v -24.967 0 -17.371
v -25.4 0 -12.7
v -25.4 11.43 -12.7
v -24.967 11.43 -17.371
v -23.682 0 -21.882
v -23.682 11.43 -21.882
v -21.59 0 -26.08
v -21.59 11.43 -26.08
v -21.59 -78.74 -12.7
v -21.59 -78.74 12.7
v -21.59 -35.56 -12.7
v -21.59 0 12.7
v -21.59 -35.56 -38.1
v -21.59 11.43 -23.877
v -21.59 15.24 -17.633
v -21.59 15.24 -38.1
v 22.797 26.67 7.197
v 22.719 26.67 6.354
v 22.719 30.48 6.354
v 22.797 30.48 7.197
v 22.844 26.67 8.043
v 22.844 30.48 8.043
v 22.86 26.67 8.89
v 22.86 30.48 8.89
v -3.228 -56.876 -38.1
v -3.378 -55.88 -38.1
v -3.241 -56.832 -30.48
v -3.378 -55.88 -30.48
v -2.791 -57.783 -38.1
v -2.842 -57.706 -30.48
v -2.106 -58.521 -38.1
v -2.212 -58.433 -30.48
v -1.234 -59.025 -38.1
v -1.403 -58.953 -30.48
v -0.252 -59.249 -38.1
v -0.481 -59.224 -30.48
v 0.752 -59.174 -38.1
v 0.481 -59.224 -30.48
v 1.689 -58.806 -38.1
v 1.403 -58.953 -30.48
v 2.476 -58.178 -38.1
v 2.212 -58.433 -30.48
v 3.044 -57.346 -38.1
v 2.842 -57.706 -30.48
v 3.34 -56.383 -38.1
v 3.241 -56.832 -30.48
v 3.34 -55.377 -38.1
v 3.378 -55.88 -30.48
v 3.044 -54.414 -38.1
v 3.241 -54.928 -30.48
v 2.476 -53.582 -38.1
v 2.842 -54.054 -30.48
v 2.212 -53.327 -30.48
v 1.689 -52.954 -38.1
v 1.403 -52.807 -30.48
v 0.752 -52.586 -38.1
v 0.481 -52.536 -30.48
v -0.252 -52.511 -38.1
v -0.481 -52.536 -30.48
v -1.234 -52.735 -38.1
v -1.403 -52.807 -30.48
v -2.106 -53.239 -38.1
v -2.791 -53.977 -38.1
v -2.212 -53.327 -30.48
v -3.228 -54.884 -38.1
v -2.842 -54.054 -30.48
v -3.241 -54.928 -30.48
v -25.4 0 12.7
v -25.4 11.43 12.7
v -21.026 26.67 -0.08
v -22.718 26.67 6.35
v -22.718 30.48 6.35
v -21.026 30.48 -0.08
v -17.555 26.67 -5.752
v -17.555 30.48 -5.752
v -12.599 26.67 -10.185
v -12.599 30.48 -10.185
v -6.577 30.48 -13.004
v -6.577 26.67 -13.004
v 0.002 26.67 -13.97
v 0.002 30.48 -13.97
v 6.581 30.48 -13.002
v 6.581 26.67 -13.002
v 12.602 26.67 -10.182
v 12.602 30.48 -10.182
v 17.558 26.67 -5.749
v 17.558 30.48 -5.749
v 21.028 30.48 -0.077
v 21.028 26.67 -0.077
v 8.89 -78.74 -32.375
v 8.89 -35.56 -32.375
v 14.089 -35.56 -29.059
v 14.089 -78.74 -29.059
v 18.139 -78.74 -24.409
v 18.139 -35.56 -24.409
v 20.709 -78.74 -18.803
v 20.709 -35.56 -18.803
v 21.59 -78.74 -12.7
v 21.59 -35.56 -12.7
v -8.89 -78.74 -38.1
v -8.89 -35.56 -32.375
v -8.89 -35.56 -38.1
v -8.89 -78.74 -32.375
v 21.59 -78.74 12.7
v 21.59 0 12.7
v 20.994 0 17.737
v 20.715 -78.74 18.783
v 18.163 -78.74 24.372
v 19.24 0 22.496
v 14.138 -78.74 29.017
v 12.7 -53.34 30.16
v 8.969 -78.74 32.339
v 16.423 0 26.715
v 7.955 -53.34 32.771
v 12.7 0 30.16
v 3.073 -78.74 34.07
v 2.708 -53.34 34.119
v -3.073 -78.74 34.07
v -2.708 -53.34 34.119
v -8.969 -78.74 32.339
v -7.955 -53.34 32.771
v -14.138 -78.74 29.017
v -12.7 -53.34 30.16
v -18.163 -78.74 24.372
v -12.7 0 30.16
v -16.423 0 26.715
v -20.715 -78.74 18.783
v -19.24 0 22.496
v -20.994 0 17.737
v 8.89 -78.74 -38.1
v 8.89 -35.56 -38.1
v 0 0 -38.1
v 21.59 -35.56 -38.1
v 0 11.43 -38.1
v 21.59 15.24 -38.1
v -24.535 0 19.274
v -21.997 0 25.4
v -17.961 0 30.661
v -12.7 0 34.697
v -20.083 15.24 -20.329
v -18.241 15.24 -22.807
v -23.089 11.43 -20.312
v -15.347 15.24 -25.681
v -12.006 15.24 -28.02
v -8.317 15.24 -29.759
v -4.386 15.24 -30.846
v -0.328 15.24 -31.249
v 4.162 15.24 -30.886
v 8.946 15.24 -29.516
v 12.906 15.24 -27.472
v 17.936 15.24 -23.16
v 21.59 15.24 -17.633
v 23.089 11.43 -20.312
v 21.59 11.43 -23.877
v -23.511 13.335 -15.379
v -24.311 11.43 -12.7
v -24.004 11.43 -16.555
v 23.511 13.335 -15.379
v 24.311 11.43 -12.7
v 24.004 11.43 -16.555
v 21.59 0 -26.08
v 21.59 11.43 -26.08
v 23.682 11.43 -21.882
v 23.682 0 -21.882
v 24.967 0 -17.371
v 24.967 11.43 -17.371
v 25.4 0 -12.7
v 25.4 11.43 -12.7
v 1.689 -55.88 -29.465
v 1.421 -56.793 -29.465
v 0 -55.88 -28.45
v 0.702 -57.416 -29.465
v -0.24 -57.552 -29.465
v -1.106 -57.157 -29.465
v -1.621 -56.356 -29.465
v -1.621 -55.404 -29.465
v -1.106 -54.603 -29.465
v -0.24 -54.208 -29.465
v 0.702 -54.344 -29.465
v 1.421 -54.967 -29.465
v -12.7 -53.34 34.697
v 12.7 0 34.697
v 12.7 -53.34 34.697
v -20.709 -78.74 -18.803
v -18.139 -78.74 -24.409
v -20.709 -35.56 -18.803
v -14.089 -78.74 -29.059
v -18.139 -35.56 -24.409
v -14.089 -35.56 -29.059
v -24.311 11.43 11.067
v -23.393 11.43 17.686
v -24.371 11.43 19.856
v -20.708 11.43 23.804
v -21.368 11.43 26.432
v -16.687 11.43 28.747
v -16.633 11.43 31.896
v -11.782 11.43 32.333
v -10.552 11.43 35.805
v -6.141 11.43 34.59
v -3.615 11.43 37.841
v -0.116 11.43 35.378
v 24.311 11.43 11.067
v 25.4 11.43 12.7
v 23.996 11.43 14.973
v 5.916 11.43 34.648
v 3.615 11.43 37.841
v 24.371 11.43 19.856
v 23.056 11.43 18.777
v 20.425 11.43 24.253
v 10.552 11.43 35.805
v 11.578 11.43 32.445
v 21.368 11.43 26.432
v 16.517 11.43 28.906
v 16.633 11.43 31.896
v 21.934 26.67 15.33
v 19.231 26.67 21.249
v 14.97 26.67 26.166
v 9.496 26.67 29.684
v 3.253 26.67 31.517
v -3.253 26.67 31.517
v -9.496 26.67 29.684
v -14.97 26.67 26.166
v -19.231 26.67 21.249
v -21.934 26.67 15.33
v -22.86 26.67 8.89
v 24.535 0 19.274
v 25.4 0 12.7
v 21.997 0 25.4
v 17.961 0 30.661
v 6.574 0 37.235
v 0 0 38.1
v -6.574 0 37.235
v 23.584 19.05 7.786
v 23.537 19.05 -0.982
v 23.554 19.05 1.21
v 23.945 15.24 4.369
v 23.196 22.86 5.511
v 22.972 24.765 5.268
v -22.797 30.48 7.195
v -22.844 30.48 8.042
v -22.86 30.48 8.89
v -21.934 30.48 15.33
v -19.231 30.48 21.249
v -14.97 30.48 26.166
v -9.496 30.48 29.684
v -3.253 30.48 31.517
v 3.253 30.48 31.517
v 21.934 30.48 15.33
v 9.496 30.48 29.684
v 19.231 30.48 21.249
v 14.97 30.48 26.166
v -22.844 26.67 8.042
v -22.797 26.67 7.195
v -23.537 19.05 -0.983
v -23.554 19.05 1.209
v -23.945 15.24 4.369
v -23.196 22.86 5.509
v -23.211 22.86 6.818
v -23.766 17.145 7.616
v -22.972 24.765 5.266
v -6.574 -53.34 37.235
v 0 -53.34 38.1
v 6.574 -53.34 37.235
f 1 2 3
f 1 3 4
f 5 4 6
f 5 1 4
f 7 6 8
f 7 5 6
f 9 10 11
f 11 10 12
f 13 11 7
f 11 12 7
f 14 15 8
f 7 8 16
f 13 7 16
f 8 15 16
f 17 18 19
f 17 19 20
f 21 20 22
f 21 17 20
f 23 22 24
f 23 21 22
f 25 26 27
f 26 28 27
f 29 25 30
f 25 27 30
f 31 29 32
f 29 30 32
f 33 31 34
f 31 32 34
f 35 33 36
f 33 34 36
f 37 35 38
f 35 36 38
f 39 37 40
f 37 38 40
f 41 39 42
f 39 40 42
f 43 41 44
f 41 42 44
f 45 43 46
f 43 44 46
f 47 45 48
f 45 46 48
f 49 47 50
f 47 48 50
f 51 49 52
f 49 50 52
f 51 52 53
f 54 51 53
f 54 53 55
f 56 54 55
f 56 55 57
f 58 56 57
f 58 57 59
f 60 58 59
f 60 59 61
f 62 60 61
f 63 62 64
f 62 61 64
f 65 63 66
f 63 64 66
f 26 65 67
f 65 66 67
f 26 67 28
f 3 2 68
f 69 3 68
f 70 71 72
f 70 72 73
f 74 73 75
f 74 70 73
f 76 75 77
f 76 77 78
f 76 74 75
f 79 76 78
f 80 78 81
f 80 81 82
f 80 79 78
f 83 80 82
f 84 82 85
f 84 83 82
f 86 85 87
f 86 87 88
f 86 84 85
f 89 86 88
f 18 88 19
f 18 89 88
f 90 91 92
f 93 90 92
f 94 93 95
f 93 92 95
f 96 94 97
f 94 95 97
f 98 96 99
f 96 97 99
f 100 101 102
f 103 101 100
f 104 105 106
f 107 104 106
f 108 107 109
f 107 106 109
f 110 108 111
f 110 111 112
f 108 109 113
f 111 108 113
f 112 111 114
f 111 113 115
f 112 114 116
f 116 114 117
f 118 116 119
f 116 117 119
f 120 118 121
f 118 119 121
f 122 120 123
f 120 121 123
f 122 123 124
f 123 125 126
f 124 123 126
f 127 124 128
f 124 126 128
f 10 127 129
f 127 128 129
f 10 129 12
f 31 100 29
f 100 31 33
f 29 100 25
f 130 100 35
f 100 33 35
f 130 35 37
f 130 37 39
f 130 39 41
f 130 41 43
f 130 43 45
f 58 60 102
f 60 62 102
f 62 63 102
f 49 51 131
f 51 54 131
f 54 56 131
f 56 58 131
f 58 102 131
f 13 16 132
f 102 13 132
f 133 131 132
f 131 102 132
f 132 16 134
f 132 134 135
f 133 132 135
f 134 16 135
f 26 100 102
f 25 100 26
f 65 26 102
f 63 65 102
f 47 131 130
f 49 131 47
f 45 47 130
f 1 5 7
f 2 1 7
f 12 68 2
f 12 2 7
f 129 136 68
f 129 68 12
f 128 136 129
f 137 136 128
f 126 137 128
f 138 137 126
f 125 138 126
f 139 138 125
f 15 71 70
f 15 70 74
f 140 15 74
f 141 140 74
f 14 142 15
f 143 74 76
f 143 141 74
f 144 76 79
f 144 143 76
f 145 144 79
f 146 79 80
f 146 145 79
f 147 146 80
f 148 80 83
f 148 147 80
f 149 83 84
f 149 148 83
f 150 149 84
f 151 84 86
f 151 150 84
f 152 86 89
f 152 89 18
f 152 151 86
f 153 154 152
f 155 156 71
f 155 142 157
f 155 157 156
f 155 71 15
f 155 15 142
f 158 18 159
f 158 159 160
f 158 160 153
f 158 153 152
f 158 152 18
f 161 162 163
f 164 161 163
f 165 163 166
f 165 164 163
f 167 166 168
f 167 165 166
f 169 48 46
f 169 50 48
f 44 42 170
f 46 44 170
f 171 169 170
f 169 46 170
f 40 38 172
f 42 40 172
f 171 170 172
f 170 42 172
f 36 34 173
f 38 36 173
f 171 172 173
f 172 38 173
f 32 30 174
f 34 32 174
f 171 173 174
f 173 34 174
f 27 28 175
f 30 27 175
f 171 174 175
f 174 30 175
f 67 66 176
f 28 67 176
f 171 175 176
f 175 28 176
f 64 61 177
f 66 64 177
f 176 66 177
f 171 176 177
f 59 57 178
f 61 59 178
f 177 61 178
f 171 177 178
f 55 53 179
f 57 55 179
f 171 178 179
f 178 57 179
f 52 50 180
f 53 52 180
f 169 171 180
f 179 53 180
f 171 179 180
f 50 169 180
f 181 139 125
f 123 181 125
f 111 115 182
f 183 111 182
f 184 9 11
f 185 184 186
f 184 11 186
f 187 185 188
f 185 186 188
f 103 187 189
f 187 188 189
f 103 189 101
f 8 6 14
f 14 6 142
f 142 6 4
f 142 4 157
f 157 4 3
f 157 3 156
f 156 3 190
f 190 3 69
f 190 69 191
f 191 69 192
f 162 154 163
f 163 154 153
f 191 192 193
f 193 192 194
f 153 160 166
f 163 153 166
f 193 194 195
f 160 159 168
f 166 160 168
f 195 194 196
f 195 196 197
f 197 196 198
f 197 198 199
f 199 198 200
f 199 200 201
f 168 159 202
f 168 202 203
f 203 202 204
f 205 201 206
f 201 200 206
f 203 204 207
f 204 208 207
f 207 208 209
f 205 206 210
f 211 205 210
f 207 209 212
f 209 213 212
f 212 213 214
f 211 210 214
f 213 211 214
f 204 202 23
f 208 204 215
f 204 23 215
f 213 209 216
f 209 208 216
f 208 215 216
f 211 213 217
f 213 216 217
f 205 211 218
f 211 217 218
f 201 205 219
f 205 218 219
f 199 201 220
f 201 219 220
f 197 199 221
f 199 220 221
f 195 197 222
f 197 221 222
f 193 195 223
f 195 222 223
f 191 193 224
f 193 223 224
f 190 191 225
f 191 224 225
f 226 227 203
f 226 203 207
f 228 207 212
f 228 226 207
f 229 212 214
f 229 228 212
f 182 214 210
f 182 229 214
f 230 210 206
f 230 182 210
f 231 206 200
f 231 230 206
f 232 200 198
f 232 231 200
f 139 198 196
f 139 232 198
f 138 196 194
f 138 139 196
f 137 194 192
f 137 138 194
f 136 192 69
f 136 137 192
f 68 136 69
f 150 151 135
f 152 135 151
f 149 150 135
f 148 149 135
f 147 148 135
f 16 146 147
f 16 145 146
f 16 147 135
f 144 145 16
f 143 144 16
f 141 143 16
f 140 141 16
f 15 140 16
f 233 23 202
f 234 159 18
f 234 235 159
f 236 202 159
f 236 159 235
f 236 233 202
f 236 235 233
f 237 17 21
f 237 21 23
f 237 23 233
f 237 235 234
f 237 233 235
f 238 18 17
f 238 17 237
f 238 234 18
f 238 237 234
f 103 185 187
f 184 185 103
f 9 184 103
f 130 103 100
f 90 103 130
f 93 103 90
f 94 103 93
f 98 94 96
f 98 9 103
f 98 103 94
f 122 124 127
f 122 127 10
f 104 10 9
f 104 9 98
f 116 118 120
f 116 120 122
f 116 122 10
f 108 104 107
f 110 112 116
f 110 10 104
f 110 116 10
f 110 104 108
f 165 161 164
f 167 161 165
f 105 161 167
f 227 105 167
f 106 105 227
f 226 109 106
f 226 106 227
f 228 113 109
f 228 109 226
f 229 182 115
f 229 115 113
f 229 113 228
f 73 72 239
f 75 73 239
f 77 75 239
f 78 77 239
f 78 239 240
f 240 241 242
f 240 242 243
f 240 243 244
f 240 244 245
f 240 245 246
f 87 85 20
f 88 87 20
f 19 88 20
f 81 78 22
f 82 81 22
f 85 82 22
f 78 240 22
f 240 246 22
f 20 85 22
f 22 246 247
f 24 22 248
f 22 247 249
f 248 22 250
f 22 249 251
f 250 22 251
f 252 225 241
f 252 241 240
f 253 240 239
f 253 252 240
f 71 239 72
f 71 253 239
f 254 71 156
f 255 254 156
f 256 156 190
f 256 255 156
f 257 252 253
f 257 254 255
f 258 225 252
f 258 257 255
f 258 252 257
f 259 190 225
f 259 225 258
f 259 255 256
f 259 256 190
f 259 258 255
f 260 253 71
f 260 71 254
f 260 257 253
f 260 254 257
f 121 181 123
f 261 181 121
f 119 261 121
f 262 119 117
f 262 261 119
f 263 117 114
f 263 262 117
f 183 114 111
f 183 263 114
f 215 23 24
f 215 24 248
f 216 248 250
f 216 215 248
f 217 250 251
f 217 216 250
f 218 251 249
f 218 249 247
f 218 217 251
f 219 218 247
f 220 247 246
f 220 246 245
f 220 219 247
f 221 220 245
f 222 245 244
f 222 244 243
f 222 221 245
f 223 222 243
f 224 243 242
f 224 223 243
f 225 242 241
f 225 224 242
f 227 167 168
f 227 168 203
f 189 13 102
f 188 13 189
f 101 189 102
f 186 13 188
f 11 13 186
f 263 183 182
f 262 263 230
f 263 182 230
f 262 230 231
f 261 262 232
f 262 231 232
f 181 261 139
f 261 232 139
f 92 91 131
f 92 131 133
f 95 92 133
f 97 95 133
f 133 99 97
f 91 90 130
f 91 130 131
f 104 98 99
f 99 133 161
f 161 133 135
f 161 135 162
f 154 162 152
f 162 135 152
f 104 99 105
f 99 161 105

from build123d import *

# Parameters (mm, degrees)
F1_DEPTH  = 78.74
F4_W      = 50.8
F4_H      = 25.4
F6_DEPTH  = 11.43
F7_W      = 48.6228571429
F7_H      = 23.7671428571
F10_DEPTH = 3.81
F12_DEPTH = 53.34
F14_DEPTH = 38.1
F16_D     = 6.7564
F16_DEPTH = 7.62
F16_TIP   = 2.0298273432


with BuildPart() as f1:
    # F0 (on Front) → F1 (new body)
    with BuildSketch(Plane.XZ):
        with BuildLine():
            Line((-21.59, 12.7), (-21.59, -12.7))
            ThreePointArc((-21.59, -12.7), (0, -34.29), (21.59, -12.7))
            Line((21.59, -12.7), (21.59, 0))
            Line((21.59, 0), (21.59, 12.7))
            ThreePointArc((21.59, 12.7), (0, 34.29), (-21.59, 12.7))
        make_face()
    extrude(amount=F1_DEPTH)

    # F4 (on Front) → F5 section 0
    with BuildSketch(Plane.XZ):
        with BuildLine():
            Line((-25.4, 12.7), (25.4, 12.7))
            ThreePointArc((25.4, 12.7), (0, 38.1), (-25.4, 12.7))
        make_face()
    # F3 (on offset) → F5 section 1
    with BuildSketch(Plane.XZ.offset(-26.67)):
        with BuildLine():
            Line((-22.86, 8.89), (22.86, 8.89))
            ThreePointArc((22.86, 8.89), (0, 31.75), (-22.86, 8.89))
        make_face()
    loft()

    # F4 (on Front) → F6 (join)
    with BuildSketch(Plane.XZ):
        with BuildLine():
            Line((-25.4, 12.7), (25.4, 12.7))
            ThreePointArc((25.4, 12.7), (0, 38.1), (-25.4, 12.7))
        make_face()
        Rectangle(F4_W, F4_H)
        with BuildLine():
            ThreePointArc((-25.4, -12.7), (0, -38.1), (25.4, -12.7))
            Line((25.4, -12.7), (-25.4, -12.7))
        make_face()
    extrude(amount=-F6_DEPTH)

    # F7 (on face) → F8 section 0
    with BuildSketch(Plane(origin=(0, 11.43, 0), x_dir=(-1, 0, 0), z_dir=(0, 1, 0))):
        with Locations((0, -0.8164285714)):
            Rectangle(F7_W, F7_H)
    # F3 (on offset) → F8 section 1
    with BuildSketch(Plane.XZ.offset(-26.67)):
        with BuildLine():
            ThreePointArc((22.7188888889, 6.3539227823), (22.8246949596, 7.62), (22.86, 8.89))
            Line((22.86, 8.89), (-22.86, 8.89))
            ThreePointArc((-22.86, 8.89), (-22.8245852305, 7.61802946), (-22.7184506514, 6.35))
            Line((-22.7184506514, 6.35), (22.7188888889, 6.3539227823))
        make_face()
    loft()

    # F3 (on offset) → F9 section 0
    with BuildSketch(Plane.XZ.offset(-26.67)):
        with BuildLine():
            ThreePointArc((-22.7184506514, 6.35), (0.0019735927, -13.9699999148), (22.7188888889, 6.3539227823))
            Line((22.7188888889, 6.3539227823), (-22.7184506514, 6.35))
        make_face()
    # F7 (on face) → F9 section 1
    with BuildSketch(Plane(origin=(0, 11.43, 0), x_dir=(-1, 0, 0), z_dir=(0, 1, 0))):
        with BuildLine():
            Line((24.3114285714, -12.7), (-24.3114285714, -12.7))
            ThreePointArc((-24.3114285714, -12.7), (0, -37.0114285714), (24.3114285714, -12.7))
        make_face()
    loft()

    # F3 (on offset) → F10 (join)
    with BuildSketch(Plane.XZ.offset(-26.67)):
        with BuildLine():
            Line((-22.86, 8.89), (22.86, 8.89))
            ThreePointArc((22.86, 8.89), (0, 31.75), (-22.86, 8.89))
        make_face()
        with BuildLine():
            ThreePointArc((22.7188888889, 6.3539227823), (22.8246949596, 7.62), (22.86, 8.89))
            Line((22.86, 8.89), (-22.86, 8.89))
            ThreePointArc((-22.86, 8.89), (-22.8245852305, 7.61802946), (-22.7184506514, 6.35))
            Line((-22.7184506514, 6.35), (22.7188888889, 6.3539227823))
        make_face()
        with BuildLine():
            ThreePointArc((-22.7184506514, 6.35), (0.0019735927, -13.9699999148), (22.7188888889, 6.3539227823))
            Line((22.7188888889, 6.3539227823), (-22.7184506514, 6.35))
        make_face()
    extrude(amount=-F10_DEPTH)

    # F11 (on Front) → F12 (join)
    with BuildSketch(Plane.XZ):
        with BuildLine():
            Line((12.7, 12.7), (12.7, 34.6970452561))
            ThreePointArc((12.7, 34.6970452561), (0, 38.1), (-12.7, 34.6970452561))
            Line((-12.7, 34.6970452561), (-12.7, 12.7))
            Line((-12.7, 12.7), (12.7, 12.7))
        make_face()
    extrude(amount=F12_DEPTH)

    # F13 (on Top) → F14 (join)
    with BuildSketch(Plane.XY):
        Polygon((21.59, -35.56), (21.59, 15.24), (-21.59, 15.24), (-21.59, -35.56), (-8.89, -35.56), (-8.89, -78.74), (8.89, -78.74), (8.89, -35.56), align=None)
    extrude(amount=-F14_DEPTH)

    # F16
    with Locations(Plane(origin=(0, 0, -38.1), x_dir=(1, 0, 0), z_dir=(0, 0, -1))):
        with Locations((0, 55.88)):
            Hole(F16_D / 2, depth=F16_DEPTH)
            with Locations((0, 0, -(F16_DEPTH + F16_TIP / 2))):  # 118° drill point
                Cone(0, F16_D / 2, F16_TIP, mode=Mode.SUBTRACT)


solid = f1.part
